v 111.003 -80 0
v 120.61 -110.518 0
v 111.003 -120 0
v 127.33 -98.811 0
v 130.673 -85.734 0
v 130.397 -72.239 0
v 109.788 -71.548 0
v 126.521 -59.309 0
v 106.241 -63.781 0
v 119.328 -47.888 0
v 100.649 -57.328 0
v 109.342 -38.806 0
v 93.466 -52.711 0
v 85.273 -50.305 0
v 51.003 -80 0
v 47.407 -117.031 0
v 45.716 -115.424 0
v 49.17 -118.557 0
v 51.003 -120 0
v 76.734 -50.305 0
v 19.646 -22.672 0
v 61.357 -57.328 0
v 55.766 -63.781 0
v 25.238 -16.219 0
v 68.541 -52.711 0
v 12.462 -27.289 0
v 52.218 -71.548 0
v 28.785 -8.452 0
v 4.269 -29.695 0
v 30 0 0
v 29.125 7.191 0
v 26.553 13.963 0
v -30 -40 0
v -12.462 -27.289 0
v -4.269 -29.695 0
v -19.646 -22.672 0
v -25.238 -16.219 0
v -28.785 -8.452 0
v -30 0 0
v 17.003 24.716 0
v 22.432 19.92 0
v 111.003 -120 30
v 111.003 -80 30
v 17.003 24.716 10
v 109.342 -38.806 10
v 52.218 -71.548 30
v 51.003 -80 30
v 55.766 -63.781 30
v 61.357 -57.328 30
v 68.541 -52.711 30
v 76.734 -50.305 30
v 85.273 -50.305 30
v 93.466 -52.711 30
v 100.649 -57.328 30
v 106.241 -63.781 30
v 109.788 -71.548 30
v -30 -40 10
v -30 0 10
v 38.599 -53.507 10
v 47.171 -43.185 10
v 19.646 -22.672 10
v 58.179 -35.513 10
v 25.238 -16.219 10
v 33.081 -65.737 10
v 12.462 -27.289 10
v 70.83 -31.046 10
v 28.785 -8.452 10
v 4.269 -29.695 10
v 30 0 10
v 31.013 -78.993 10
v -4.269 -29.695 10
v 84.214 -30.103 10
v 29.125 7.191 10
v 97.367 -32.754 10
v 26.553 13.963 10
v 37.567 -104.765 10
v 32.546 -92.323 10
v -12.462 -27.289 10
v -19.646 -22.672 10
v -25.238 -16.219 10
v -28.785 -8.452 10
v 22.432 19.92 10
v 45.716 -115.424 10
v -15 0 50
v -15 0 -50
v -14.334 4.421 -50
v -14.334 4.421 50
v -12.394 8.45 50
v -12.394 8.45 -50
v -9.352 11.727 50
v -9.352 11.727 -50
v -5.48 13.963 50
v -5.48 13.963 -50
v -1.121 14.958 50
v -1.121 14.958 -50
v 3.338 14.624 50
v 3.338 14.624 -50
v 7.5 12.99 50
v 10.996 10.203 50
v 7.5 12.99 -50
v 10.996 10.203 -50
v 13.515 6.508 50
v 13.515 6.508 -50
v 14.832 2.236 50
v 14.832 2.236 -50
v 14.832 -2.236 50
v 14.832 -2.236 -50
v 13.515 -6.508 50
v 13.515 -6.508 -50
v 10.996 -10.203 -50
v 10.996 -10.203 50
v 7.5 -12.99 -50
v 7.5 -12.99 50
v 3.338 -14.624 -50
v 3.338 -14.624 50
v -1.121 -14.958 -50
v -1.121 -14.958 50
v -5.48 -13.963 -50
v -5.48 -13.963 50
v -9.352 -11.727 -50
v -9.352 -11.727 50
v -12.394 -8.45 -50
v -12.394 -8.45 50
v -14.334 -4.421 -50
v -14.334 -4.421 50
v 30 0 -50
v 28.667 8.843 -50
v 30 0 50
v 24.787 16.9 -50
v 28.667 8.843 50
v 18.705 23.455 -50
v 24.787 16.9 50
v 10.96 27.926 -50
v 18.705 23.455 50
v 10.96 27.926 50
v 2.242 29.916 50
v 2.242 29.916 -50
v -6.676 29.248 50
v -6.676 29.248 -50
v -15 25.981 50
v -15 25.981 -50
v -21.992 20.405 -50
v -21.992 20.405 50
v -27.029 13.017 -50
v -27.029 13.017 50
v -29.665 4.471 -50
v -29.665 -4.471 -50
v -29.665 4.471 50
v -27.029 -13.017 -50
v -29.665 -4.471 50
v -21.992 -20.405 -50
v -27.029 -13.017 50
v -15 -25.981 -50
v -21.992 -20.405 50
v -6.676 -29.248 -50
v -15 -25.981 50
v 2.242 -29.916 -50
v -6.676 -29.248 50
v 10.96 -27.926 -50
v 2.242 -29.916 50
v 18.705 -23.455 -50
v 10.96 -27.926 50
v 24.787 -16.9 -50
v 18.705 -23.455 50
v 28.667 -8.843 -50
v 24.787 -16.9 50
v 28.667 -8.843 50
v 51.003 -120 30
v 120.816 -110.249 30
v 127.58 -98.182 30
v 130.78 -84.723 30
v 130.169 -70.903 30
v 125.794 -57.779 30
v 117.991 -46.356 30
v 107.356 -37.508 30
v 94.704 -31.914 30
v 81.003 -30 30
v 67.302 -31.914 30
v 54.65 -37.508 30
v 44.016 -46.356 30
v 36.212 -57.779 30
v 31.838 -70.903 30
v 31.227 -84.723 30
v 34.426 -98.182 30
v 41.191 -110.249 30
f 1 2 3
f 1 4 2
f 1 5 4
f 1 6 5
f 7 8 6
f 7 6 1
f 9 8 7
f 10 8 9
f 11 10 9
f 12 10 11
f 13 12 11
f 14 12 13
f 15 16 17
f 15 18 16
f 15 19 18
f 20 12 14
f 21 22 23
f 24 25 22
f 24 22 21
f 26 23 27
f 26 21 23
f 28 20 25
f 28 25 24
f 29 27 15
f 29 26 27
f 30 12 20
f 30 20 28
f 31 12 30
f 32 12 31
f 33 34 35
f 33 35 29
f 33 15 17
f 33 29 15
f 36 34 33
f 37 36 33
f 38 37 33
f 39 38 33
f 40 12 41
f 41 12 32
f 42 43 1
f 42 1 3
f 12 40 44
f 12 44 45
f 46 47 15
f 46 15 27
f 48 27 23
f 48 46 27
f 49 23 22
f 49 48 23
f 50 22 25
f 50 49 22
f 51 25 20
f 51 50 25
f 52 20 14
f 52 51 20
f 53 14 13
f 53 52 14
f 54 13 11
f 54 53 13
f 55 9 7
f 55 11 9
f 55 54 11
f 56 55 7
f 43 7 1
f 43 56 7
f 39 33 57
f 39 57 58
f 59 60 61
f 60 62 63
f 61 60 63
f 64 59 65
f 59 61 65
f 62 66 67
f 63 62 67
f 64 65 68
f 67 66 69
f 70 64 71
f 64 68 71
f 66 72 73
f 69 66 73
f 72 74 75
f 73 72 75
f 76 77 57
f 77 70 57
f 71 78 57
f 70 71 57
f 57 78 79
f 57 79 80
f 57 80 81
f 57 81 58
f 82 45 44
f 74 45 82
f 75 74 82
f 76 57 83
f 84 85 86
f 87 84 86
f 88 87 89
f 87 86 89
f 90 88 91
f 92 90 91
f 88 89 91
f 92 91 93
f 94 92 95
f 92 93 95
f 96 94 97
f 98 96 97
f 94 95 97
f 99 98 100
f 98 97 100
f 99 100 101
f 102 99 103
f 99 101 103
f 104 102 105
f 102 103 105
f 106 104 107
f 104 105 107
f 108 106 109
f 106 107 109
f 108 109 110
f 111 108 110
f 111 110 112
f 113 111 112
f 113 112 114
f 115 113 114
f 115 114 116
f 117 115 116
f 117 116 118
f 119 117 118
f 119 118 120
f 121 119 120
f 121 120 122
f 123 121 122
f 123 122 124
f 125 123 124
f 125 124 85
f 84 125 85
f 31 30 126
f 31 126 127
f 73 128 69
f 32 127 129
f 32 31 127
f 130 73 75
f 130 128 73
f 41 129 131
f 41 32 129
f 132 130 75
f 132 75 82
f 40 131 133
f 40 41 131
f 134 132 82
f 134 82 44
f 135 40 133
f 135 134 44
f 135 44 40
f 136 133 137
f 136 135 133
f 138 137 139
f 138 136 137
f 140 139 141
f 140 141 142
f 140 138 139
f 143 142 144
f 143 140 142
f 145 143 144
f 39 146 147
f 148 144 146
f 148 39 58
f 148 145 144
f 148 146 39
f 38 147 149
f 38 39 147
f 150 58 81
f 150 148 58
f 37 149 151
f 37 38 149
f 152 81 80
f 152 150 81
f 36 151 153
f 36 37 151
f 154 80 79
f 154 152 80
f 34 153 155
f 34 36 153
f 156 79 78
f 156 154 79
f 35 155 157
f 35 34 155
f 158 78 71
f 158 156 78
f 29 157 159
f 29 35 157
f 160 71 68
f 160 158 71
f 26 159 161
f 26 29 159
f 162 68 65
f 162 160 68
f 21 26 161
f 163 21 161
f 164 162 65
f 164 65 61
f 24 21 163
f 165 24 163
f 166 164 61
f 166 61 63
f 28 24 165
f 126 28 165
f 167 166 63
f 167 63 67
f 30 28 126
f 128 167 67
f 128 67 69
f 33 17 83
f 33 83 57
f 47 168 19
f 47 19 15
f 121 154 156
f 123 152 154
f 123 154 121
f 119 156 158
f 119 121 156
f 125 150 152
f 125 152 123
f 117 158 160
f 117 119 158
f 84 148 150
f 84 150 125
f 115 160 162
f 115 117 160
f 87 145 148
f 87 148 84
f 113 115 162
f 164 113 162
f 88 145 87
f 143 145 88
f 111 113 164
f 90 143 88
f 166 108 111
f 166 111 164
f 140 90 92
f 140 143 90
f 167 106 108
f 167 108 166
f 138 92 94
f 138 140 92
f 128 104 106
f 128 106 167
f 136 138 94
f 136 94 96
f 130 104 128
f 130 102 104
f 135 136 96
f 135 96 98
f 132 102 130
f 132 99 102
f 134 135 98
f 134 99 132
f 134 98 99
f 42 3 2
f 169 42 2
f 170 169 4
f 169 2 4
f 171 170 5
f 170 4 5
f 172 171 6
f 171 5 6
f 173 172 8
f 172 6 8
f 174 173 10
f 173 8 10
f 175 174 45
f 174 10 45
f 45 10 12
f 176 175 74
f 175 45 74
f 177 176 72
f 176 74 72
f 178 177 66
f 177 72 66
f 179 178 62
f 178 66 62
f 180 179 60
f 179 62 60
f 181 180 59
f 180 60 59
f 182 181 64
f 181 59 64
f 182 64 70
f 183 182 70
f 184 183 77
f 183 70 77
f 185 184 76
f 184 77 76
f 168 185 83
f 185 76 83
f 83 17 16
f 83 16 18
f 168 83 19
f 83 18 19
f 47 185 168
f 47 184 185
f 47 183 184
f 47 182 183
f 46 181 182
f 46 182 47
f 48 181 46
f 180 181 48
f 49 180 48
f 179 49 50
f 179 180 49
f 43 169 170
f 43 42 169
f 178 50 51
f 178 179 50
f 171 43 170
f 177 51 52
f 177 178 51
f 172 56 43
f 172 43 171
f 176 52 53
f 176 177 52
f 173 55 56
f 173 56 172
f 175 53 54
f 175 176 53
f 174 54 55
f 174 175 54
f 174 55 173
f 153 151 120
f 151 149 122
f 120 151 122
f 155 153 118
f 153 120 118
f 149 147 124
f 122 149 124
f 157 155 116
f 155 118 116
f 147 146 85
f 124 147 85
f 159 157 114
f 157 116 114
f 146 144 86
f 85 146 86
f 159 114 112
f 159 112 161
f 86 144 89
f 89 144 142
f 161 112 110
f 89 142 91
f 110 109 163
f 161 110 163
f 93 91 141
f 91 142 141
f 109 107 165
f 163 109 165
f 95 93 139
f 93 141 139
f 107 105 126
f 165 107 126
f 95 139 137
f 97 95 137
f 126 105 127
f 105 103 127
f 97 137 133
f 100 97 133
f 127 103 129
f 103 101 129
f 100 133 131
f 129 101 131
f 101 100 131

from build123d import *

# Parameters (mm, degrees)
SKETCH1_R             = 30
BOSS_EXTRUDE1_DEPTH   = 50
SKETCH2_R             = 50
BOSS_EXTRUDE2_DEPTH   = 30
BOSS_EXTRUDE3_DEPTH   = 10
F_1_5MM_DOWEL_HOLE1_D = 30
CUT_EXTRUDE1_DEPTH    = 202.15131476


with BuildPart() as part:
    # Sketch1 → Boss-Extrude1 (new, symmetric)
    with BuildSketch(Plane.XY):
        Circle(SKETCH1_R)
    extrude(amount=BOSS_EXTRUDE1_DEPTH, both=True)



with BuildPart() as body_2:
    # Sketch2 → Boss-Extrude2 (new body)
    with BuildSketch(Plane.XY):
        with Locations((81.003249692, -80)):
            Circle(SKETCH2_R)
    extrude(amount=BOSS_EXTRUDE2_DEPTH)


with BuildPart() as part_1:
    add(part.part)

    add(body_2.part)  # Boss-Extrude3 merges body 2
    # Sketch3 → Boss-Extrude3 (add)
    with BuildSketch(Plane.XY):
        Polygon((17.003072039, 24.716301124), (109.34170309, -38.806164794), (45.716447378, -115.423743202), (-30, -40), (-30, 0), align=None)
    extrude(amount=BOSS_EXTRUDE3_DEPTH)

    # Ø1.5mm Dowel Hole1 (through all)
    with Locations(Plane.XY.offset(50)):
        with Locations((0, 0)):
            Hole(F_1_5MM_DOWEL_HOLE1_D / 2)

    # Sketch6 → Cut-Extrude1 (cut, through all)
    with BuildSketch(Plane.XY.offset(30)):
        with BuildLine():
            Line((111.003249692, -80), (111.003249692, -166.852911506))
            ThreePointArc((111.003249692, -166.852911506), (81.003249692, -196.852911506), (51.003249692, -166.852911506))
            Line((51.003249692, -166.852911506), (51.003249692, -80))
            ThreePointArc((51.003249692, -80), (81.003249692, -50), (111.003249692, -80))
        make_face()
    extrude(amount=-CUT_EXTRUDE1_DEPTH, mode=Mode.SUBTRACT)


solid = part_1.part
